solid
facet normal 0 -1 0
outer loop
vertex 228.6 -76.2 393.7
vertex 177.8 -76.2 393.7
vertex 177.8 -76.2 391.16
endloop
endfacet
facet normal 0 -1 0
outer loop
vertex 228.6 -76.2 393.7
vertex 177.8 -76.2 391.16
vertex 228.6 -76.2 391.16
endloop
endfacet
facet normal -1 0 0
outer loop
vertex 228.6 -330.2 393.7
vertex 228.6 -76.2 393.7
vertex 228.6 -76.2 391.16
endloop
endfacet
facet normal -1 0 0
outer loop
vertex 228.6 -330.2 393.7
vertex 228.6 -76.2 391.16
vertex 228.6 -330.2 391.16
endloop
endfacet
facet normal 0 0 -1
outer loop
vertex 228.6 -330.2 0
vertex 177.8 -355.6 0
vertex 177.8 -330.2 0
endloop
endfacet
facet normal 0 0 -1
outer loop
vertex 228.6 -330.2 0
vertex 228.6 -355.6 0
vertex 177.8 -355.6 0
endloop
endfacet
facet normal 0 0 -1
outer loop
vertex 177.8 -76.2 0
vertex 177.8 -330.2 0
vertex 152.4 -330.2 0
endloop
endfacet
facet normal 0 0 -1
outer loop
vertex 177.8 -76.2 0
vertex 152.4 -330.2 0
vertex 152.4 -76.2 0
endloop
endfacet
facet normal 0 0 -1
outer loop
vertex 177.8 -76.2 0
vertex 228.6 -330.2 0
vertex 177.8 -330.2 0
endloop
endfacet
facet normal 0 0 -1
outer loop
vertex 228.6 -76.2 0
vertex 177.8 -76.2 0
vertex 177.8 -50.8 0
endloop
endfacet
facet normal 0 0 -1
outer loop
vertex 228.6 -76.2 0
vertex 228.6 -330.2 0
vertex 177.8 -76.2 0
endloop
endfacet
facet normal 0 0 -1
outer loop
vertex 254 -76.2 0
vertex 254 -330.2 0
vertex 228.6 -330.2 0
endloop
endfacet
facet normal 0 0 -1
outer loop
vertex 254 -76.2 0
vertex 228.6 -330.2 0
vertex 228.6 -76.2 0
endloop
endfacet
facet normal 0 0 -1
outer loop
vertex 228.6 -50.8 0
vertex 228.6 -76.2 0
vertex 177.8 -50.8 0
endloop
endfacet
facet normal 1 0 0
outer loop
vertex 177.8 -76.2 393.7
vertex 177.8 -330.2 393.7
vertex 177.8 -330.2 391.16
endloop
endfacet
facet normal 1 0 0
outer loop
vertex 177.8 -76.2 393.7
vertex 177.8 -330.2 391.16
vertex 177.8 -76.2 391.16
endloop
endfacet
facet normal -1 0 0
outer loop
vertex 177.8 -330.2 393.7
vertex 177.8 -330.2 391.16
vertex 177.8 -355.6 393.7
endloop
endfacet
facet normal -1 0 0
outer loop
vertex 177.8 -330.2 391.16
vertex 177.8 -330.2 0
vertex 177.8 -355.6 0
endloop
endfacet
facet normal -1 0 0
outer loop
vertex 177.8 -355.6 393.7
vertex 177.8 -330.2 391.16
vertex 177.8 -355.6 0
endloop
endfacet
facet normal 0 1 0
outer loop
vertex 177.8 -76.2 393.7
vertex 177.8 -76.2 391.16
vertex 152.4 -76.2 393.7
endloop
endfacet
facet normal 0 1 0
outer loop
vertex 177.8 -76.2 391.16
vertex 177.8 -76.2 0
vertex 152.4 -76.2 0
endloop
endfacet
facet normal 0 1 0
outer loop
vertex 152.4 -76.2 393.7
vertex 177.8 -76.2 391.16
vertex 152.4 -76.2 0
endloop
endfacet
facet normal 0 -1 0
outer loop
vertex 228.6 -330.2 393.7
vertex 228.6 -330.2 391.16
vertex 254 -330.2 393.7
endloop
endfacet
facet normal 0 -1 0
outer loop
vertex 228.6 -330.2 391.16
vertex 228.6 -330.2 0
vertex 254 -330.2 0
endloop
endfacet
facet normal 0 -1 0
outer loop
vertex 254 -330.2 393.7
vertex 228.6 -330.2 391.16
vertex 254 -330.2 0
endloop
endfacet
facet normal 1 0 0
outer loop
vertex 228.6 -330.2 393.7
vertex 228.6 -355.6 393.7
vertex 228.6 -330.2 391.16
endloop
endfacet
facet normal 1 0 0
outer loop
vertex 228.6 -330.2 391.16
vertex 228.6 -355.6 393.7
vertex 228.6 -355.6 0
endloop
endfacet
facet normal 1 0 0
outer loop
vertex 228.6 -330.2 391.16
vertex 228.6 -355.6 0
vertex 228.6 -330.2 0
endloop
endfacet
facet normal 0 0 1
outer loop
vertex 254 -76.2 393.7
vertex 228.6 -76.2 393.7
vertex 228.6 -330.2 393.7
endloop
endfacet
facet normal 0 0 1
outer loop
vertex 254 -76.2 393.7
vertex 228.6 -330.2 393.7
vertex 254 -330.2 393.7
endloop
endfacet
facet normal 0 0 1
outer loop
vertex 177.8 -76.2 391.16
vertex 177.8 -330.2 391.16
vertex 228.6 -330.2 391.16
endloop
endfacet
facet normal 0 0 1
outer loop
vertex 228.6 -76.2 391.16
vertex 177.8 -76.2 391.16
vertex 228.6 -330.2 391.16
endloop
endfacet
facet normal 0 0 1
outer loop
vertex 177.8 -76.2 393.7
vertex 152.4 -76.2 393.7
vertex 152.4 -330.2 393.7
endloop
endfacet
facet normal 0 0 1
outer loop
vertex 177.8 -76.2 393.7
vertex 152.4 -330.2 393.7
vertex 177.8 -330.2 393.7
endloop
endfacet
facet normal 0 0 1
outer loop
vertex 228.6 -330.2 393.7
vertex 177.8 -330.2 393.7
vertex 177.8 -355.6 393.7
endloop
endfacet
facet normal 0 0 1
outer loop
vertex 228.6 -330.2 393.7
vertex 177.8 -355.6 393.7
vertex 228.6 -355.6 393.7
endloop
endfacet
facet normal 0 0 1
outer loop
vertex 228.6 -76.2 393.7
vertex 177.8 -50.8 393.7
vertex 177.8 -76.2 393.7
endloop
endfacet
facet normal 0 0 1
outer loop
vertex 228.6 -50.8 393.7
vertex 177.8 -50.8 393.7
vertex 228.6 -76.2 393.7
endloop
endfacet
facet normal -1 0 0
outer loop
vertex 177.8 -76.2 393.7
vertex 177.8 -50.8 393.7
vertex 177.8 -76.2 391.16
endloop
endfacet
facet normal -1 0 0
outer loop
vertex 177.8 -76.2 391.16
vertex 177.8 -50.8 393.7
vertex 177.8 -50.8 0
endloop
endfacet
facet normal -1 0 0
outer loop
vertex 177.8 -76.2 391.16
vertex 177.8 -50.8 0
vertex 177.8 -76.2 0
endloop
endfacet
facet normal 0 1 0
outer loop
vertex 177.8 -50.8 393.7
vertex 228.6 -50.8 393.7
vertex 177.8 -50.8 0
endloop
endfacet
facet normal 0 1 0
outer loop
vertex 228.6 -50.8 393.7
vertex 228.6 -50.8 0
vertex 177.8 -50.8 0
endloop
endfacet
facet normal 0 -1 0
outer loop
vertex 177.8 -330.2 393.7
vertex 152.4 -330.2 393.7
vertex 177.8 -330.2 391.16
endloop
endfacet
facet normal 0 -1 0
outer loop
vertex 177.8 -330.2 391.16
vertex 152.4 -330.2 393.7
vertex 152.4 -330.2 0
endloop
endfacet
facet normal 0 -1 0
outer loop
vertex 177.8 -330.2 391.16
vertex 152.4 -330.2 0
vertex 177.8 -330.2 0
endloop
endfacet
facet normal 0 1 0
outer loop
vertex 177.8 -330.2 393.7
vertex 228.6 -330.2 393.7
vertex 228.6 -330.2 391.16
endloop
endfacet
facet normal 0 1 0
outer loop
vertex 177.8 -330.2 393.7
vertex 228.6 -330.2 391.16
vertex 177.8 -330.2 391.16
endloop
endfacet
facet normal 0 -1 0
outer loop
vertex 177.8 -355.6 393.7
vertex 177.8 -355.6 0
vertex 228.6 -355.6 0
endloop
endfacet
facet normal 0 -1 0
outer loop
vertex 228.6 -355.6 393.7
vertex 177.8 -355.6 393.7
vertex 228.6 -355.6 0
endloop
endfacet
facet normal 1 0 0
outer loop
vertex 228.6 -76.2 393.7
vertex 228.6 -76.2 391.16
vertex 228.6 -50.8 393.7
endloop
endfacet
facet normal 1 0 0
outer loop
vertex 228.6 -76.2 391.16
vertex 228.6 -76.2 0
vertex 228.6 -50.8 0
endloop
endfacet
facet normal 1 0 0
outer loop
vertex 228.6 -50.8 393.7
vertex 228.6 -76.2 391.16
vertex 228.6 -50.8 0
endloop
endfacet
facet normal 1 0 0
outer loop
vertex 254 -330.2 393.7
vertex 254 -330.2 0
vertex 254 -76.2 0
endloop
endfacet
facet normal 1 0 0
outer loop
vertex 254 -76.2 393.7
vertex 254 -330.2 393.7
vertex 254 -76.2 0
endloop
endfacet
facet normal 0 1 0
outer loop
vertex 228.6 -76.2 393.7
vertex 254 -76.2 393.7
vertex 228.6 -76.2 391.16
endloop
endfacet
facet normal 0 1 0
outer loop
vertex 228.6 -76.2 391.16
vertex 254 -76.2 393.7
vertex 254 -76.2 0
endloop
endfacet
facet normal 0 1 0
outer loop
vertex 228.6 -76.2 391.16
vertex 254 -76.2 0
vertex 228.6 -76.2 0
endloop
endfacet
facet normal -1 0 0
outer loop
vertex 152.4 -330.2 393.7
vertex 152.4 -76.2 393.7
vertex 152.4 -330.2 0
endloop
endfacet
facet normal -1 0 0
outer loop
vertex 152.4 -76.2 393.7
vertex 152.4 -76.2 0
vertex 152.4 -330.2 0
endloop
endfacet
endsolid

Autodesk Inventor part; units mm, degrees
ref_plane "YZ Plane" through (0, 0, 0) normal (1, 0, 0) x (0, 1, 0)
ref_plane "XZ Plane" through (0, 0, 0) normal (0, 1, 0) x (-1, 0, 0)
ref_plane "XY Plane" through (0, 0, 0) normal (0, 0, 1) x (1, 0, 0)
sketch "Sketch1" plane through (0, 0, 0) normal (0, 0, 1) x (1, 0, 0)
  line L0 (0, 0) -> (812.8, 0) construction
  line L1 (812.8, 0) -> (812.8, -406.4) construction
  line L2 (812.8, -406.4) -> (0, -406.4) construction
  line L3 (0, -406.4) -> (0, 0) construction
  line L4 (0, 0) -> (406.4, 0)
  line L5 (406.4, 0) -> (406.4, -25.4)
  line L6 (406.4, -25.4) -> (0, -25.4)
  line L7 (0, -25.4) -> (0, 0)
  line L8 (406.4, -25.4) -> (381, -25.4)
  line L9 (381, -25.4) -> (381, -406.4)
  line L10 (381, -406.4) -> (406.4, -406.4)
  line L11 (406.4, -406.4) -> (406.4, -25.4)
  line L12 (381, -406.4) -> (0, -406.4)
  line L13 (0, -406.4) -> (0, -381)
  line L14 (0, -381) -> (381, -381)
  line L15 (381, -381) -> (381, -406.4)
  line L16 (0, -381) -> (25.4, -381)
  line L17 (25.4, -381) -> (25.4, -25.4)
  line L18 (25.4, -25.4) -> (0, -25.4)
  line L19 (0, -25.4) -> (0, -381)
  dimension "d1" = 812.8
  dimension "d5" = 406.4
  dimension "d6" = 25.4
  dimension "d7" = 25.4
  dimension "d8" = 381
  dimension "d9" = 381
  dimension "d10" = 25.4
  dimension "d11" = 25.4
extrude "Extrusion1" add sketch "Sketch1" against normal blind 25.4 contours L6 L9 L14 L17
sketch "Sketch3" plane through (0, 0, 0) normal (0, 0, 1) x (1, 0, 0)
  line L0 (-406.4, 0) -> (406.4, 0) construction
  line L1 (406.4, 0) -> (406.4, -406.4) construction
  line L2 (406.4, -406.4) -> (-406.4, -406.4) construction
  line L3 (-406.4, -406.4) -> (-406.4, 0) construction
  line L4 (406.4, -406.4) -> (406.4, 0)
  line L5 (381, -381) -> (25.4, -381) projected
  line L6 (25.4, -381) -> (177.8, -381)
  line L7 (177.8, -381) -> (203.2, -381)
  line L8 (177.8, -381) -> (177.8, -355.6)
  line L9 (177.8, -355.6) -> (228.6, -355.6)
  line L10 (228.6, -355.6) -> (228.6, -330.2)
  line L11 (228.6, -330.2) -> (254, -330.2)
  line L12 (254, -330.2) -> (254, -76.2)
  line L13 (254, -76.2) -> (228.6, -76.2)
  line L14 (228.6, -76.2) -> (228.6, -50.8)
  line L15 (228.6, -50.8) -> (177.8, -50.8)
  line L16 (177.8, -50.8) -> (177.8, -76.2)
  line L17 (177.8, -76.2) -> (152.4, -76.2)
  line L18 (152.4, -76.2) -> (152.4, -330.2)
  line L19 (152.4, -330.2) -> (177.8, -330.2)
  line L20 (177.8, -330.2) -> (177.8, -355.6)
  point P0 (0, 0)
  dimension "d36" = 812.8
  dimension "d48" = 152.4
  dimension "d49" = 25.4
  dimension "d50" = 25.4
  dimension "d51" = 50.8
  dimension "d52" = 25.4
  dimension "d53" = 25.4
  dimension "d54" = 254
  dimension "d55" = 25.4
  dimension "d56" = 25.4
  dimension "d57" = 50.8
  dimension "d58" = 25.4
  dimension "d59" = 25.4
  dimension "d60" = 254
  dimension "d61" = 25.4
extrude "Extrusion3" add sketch "Sketch3" along normal blind 393.7
sketch "Sketch4" plane through (381, -381, 0) normal (1, 0, 0) x (0, 0, -1)
  line L0 (0, 355.6) -> (25.4, 355.6) projected
  line L1 (153.8842, -0.5875) -> (0, -0.5875)
  line L2 (0, -0.5875) -> (0, 355.6)
  line L3 (0, 355.6) -> (153.8842, 355.6)
  line L4 (153.8842, 355.6) -> (153.8842, -0.5875)
  point P0 (0, 381)
extrude "Extrusion4" cut sketch "Sketch4" against normal blind 393.7
sketch "Sketch5" plane through (0, 0, 393.7) normal (0, 0, 1) x (1, 0, 0)
  line L0 (177.8, -50.8) -> (177.8, -76.2) projected
  line L1 (228.6, -355.6) -> (228.6, -330.2) projected
  line L2 (177.8, -76.2) -> (228.6, -76.2)
  line L3 (228.6, -76.2) -> (228.6, -330.2)
  line L4 (228.6, -330.2) -> (177.8, -330.2)
  line L5 (177.8, -330.2) -> (177.8, -76.2)
  point P0 (0, 0)
extrude "Extrusion5" cut sketch "Sketch5" against normal blind 2.54
properties part number "JukeBox CD Player"
